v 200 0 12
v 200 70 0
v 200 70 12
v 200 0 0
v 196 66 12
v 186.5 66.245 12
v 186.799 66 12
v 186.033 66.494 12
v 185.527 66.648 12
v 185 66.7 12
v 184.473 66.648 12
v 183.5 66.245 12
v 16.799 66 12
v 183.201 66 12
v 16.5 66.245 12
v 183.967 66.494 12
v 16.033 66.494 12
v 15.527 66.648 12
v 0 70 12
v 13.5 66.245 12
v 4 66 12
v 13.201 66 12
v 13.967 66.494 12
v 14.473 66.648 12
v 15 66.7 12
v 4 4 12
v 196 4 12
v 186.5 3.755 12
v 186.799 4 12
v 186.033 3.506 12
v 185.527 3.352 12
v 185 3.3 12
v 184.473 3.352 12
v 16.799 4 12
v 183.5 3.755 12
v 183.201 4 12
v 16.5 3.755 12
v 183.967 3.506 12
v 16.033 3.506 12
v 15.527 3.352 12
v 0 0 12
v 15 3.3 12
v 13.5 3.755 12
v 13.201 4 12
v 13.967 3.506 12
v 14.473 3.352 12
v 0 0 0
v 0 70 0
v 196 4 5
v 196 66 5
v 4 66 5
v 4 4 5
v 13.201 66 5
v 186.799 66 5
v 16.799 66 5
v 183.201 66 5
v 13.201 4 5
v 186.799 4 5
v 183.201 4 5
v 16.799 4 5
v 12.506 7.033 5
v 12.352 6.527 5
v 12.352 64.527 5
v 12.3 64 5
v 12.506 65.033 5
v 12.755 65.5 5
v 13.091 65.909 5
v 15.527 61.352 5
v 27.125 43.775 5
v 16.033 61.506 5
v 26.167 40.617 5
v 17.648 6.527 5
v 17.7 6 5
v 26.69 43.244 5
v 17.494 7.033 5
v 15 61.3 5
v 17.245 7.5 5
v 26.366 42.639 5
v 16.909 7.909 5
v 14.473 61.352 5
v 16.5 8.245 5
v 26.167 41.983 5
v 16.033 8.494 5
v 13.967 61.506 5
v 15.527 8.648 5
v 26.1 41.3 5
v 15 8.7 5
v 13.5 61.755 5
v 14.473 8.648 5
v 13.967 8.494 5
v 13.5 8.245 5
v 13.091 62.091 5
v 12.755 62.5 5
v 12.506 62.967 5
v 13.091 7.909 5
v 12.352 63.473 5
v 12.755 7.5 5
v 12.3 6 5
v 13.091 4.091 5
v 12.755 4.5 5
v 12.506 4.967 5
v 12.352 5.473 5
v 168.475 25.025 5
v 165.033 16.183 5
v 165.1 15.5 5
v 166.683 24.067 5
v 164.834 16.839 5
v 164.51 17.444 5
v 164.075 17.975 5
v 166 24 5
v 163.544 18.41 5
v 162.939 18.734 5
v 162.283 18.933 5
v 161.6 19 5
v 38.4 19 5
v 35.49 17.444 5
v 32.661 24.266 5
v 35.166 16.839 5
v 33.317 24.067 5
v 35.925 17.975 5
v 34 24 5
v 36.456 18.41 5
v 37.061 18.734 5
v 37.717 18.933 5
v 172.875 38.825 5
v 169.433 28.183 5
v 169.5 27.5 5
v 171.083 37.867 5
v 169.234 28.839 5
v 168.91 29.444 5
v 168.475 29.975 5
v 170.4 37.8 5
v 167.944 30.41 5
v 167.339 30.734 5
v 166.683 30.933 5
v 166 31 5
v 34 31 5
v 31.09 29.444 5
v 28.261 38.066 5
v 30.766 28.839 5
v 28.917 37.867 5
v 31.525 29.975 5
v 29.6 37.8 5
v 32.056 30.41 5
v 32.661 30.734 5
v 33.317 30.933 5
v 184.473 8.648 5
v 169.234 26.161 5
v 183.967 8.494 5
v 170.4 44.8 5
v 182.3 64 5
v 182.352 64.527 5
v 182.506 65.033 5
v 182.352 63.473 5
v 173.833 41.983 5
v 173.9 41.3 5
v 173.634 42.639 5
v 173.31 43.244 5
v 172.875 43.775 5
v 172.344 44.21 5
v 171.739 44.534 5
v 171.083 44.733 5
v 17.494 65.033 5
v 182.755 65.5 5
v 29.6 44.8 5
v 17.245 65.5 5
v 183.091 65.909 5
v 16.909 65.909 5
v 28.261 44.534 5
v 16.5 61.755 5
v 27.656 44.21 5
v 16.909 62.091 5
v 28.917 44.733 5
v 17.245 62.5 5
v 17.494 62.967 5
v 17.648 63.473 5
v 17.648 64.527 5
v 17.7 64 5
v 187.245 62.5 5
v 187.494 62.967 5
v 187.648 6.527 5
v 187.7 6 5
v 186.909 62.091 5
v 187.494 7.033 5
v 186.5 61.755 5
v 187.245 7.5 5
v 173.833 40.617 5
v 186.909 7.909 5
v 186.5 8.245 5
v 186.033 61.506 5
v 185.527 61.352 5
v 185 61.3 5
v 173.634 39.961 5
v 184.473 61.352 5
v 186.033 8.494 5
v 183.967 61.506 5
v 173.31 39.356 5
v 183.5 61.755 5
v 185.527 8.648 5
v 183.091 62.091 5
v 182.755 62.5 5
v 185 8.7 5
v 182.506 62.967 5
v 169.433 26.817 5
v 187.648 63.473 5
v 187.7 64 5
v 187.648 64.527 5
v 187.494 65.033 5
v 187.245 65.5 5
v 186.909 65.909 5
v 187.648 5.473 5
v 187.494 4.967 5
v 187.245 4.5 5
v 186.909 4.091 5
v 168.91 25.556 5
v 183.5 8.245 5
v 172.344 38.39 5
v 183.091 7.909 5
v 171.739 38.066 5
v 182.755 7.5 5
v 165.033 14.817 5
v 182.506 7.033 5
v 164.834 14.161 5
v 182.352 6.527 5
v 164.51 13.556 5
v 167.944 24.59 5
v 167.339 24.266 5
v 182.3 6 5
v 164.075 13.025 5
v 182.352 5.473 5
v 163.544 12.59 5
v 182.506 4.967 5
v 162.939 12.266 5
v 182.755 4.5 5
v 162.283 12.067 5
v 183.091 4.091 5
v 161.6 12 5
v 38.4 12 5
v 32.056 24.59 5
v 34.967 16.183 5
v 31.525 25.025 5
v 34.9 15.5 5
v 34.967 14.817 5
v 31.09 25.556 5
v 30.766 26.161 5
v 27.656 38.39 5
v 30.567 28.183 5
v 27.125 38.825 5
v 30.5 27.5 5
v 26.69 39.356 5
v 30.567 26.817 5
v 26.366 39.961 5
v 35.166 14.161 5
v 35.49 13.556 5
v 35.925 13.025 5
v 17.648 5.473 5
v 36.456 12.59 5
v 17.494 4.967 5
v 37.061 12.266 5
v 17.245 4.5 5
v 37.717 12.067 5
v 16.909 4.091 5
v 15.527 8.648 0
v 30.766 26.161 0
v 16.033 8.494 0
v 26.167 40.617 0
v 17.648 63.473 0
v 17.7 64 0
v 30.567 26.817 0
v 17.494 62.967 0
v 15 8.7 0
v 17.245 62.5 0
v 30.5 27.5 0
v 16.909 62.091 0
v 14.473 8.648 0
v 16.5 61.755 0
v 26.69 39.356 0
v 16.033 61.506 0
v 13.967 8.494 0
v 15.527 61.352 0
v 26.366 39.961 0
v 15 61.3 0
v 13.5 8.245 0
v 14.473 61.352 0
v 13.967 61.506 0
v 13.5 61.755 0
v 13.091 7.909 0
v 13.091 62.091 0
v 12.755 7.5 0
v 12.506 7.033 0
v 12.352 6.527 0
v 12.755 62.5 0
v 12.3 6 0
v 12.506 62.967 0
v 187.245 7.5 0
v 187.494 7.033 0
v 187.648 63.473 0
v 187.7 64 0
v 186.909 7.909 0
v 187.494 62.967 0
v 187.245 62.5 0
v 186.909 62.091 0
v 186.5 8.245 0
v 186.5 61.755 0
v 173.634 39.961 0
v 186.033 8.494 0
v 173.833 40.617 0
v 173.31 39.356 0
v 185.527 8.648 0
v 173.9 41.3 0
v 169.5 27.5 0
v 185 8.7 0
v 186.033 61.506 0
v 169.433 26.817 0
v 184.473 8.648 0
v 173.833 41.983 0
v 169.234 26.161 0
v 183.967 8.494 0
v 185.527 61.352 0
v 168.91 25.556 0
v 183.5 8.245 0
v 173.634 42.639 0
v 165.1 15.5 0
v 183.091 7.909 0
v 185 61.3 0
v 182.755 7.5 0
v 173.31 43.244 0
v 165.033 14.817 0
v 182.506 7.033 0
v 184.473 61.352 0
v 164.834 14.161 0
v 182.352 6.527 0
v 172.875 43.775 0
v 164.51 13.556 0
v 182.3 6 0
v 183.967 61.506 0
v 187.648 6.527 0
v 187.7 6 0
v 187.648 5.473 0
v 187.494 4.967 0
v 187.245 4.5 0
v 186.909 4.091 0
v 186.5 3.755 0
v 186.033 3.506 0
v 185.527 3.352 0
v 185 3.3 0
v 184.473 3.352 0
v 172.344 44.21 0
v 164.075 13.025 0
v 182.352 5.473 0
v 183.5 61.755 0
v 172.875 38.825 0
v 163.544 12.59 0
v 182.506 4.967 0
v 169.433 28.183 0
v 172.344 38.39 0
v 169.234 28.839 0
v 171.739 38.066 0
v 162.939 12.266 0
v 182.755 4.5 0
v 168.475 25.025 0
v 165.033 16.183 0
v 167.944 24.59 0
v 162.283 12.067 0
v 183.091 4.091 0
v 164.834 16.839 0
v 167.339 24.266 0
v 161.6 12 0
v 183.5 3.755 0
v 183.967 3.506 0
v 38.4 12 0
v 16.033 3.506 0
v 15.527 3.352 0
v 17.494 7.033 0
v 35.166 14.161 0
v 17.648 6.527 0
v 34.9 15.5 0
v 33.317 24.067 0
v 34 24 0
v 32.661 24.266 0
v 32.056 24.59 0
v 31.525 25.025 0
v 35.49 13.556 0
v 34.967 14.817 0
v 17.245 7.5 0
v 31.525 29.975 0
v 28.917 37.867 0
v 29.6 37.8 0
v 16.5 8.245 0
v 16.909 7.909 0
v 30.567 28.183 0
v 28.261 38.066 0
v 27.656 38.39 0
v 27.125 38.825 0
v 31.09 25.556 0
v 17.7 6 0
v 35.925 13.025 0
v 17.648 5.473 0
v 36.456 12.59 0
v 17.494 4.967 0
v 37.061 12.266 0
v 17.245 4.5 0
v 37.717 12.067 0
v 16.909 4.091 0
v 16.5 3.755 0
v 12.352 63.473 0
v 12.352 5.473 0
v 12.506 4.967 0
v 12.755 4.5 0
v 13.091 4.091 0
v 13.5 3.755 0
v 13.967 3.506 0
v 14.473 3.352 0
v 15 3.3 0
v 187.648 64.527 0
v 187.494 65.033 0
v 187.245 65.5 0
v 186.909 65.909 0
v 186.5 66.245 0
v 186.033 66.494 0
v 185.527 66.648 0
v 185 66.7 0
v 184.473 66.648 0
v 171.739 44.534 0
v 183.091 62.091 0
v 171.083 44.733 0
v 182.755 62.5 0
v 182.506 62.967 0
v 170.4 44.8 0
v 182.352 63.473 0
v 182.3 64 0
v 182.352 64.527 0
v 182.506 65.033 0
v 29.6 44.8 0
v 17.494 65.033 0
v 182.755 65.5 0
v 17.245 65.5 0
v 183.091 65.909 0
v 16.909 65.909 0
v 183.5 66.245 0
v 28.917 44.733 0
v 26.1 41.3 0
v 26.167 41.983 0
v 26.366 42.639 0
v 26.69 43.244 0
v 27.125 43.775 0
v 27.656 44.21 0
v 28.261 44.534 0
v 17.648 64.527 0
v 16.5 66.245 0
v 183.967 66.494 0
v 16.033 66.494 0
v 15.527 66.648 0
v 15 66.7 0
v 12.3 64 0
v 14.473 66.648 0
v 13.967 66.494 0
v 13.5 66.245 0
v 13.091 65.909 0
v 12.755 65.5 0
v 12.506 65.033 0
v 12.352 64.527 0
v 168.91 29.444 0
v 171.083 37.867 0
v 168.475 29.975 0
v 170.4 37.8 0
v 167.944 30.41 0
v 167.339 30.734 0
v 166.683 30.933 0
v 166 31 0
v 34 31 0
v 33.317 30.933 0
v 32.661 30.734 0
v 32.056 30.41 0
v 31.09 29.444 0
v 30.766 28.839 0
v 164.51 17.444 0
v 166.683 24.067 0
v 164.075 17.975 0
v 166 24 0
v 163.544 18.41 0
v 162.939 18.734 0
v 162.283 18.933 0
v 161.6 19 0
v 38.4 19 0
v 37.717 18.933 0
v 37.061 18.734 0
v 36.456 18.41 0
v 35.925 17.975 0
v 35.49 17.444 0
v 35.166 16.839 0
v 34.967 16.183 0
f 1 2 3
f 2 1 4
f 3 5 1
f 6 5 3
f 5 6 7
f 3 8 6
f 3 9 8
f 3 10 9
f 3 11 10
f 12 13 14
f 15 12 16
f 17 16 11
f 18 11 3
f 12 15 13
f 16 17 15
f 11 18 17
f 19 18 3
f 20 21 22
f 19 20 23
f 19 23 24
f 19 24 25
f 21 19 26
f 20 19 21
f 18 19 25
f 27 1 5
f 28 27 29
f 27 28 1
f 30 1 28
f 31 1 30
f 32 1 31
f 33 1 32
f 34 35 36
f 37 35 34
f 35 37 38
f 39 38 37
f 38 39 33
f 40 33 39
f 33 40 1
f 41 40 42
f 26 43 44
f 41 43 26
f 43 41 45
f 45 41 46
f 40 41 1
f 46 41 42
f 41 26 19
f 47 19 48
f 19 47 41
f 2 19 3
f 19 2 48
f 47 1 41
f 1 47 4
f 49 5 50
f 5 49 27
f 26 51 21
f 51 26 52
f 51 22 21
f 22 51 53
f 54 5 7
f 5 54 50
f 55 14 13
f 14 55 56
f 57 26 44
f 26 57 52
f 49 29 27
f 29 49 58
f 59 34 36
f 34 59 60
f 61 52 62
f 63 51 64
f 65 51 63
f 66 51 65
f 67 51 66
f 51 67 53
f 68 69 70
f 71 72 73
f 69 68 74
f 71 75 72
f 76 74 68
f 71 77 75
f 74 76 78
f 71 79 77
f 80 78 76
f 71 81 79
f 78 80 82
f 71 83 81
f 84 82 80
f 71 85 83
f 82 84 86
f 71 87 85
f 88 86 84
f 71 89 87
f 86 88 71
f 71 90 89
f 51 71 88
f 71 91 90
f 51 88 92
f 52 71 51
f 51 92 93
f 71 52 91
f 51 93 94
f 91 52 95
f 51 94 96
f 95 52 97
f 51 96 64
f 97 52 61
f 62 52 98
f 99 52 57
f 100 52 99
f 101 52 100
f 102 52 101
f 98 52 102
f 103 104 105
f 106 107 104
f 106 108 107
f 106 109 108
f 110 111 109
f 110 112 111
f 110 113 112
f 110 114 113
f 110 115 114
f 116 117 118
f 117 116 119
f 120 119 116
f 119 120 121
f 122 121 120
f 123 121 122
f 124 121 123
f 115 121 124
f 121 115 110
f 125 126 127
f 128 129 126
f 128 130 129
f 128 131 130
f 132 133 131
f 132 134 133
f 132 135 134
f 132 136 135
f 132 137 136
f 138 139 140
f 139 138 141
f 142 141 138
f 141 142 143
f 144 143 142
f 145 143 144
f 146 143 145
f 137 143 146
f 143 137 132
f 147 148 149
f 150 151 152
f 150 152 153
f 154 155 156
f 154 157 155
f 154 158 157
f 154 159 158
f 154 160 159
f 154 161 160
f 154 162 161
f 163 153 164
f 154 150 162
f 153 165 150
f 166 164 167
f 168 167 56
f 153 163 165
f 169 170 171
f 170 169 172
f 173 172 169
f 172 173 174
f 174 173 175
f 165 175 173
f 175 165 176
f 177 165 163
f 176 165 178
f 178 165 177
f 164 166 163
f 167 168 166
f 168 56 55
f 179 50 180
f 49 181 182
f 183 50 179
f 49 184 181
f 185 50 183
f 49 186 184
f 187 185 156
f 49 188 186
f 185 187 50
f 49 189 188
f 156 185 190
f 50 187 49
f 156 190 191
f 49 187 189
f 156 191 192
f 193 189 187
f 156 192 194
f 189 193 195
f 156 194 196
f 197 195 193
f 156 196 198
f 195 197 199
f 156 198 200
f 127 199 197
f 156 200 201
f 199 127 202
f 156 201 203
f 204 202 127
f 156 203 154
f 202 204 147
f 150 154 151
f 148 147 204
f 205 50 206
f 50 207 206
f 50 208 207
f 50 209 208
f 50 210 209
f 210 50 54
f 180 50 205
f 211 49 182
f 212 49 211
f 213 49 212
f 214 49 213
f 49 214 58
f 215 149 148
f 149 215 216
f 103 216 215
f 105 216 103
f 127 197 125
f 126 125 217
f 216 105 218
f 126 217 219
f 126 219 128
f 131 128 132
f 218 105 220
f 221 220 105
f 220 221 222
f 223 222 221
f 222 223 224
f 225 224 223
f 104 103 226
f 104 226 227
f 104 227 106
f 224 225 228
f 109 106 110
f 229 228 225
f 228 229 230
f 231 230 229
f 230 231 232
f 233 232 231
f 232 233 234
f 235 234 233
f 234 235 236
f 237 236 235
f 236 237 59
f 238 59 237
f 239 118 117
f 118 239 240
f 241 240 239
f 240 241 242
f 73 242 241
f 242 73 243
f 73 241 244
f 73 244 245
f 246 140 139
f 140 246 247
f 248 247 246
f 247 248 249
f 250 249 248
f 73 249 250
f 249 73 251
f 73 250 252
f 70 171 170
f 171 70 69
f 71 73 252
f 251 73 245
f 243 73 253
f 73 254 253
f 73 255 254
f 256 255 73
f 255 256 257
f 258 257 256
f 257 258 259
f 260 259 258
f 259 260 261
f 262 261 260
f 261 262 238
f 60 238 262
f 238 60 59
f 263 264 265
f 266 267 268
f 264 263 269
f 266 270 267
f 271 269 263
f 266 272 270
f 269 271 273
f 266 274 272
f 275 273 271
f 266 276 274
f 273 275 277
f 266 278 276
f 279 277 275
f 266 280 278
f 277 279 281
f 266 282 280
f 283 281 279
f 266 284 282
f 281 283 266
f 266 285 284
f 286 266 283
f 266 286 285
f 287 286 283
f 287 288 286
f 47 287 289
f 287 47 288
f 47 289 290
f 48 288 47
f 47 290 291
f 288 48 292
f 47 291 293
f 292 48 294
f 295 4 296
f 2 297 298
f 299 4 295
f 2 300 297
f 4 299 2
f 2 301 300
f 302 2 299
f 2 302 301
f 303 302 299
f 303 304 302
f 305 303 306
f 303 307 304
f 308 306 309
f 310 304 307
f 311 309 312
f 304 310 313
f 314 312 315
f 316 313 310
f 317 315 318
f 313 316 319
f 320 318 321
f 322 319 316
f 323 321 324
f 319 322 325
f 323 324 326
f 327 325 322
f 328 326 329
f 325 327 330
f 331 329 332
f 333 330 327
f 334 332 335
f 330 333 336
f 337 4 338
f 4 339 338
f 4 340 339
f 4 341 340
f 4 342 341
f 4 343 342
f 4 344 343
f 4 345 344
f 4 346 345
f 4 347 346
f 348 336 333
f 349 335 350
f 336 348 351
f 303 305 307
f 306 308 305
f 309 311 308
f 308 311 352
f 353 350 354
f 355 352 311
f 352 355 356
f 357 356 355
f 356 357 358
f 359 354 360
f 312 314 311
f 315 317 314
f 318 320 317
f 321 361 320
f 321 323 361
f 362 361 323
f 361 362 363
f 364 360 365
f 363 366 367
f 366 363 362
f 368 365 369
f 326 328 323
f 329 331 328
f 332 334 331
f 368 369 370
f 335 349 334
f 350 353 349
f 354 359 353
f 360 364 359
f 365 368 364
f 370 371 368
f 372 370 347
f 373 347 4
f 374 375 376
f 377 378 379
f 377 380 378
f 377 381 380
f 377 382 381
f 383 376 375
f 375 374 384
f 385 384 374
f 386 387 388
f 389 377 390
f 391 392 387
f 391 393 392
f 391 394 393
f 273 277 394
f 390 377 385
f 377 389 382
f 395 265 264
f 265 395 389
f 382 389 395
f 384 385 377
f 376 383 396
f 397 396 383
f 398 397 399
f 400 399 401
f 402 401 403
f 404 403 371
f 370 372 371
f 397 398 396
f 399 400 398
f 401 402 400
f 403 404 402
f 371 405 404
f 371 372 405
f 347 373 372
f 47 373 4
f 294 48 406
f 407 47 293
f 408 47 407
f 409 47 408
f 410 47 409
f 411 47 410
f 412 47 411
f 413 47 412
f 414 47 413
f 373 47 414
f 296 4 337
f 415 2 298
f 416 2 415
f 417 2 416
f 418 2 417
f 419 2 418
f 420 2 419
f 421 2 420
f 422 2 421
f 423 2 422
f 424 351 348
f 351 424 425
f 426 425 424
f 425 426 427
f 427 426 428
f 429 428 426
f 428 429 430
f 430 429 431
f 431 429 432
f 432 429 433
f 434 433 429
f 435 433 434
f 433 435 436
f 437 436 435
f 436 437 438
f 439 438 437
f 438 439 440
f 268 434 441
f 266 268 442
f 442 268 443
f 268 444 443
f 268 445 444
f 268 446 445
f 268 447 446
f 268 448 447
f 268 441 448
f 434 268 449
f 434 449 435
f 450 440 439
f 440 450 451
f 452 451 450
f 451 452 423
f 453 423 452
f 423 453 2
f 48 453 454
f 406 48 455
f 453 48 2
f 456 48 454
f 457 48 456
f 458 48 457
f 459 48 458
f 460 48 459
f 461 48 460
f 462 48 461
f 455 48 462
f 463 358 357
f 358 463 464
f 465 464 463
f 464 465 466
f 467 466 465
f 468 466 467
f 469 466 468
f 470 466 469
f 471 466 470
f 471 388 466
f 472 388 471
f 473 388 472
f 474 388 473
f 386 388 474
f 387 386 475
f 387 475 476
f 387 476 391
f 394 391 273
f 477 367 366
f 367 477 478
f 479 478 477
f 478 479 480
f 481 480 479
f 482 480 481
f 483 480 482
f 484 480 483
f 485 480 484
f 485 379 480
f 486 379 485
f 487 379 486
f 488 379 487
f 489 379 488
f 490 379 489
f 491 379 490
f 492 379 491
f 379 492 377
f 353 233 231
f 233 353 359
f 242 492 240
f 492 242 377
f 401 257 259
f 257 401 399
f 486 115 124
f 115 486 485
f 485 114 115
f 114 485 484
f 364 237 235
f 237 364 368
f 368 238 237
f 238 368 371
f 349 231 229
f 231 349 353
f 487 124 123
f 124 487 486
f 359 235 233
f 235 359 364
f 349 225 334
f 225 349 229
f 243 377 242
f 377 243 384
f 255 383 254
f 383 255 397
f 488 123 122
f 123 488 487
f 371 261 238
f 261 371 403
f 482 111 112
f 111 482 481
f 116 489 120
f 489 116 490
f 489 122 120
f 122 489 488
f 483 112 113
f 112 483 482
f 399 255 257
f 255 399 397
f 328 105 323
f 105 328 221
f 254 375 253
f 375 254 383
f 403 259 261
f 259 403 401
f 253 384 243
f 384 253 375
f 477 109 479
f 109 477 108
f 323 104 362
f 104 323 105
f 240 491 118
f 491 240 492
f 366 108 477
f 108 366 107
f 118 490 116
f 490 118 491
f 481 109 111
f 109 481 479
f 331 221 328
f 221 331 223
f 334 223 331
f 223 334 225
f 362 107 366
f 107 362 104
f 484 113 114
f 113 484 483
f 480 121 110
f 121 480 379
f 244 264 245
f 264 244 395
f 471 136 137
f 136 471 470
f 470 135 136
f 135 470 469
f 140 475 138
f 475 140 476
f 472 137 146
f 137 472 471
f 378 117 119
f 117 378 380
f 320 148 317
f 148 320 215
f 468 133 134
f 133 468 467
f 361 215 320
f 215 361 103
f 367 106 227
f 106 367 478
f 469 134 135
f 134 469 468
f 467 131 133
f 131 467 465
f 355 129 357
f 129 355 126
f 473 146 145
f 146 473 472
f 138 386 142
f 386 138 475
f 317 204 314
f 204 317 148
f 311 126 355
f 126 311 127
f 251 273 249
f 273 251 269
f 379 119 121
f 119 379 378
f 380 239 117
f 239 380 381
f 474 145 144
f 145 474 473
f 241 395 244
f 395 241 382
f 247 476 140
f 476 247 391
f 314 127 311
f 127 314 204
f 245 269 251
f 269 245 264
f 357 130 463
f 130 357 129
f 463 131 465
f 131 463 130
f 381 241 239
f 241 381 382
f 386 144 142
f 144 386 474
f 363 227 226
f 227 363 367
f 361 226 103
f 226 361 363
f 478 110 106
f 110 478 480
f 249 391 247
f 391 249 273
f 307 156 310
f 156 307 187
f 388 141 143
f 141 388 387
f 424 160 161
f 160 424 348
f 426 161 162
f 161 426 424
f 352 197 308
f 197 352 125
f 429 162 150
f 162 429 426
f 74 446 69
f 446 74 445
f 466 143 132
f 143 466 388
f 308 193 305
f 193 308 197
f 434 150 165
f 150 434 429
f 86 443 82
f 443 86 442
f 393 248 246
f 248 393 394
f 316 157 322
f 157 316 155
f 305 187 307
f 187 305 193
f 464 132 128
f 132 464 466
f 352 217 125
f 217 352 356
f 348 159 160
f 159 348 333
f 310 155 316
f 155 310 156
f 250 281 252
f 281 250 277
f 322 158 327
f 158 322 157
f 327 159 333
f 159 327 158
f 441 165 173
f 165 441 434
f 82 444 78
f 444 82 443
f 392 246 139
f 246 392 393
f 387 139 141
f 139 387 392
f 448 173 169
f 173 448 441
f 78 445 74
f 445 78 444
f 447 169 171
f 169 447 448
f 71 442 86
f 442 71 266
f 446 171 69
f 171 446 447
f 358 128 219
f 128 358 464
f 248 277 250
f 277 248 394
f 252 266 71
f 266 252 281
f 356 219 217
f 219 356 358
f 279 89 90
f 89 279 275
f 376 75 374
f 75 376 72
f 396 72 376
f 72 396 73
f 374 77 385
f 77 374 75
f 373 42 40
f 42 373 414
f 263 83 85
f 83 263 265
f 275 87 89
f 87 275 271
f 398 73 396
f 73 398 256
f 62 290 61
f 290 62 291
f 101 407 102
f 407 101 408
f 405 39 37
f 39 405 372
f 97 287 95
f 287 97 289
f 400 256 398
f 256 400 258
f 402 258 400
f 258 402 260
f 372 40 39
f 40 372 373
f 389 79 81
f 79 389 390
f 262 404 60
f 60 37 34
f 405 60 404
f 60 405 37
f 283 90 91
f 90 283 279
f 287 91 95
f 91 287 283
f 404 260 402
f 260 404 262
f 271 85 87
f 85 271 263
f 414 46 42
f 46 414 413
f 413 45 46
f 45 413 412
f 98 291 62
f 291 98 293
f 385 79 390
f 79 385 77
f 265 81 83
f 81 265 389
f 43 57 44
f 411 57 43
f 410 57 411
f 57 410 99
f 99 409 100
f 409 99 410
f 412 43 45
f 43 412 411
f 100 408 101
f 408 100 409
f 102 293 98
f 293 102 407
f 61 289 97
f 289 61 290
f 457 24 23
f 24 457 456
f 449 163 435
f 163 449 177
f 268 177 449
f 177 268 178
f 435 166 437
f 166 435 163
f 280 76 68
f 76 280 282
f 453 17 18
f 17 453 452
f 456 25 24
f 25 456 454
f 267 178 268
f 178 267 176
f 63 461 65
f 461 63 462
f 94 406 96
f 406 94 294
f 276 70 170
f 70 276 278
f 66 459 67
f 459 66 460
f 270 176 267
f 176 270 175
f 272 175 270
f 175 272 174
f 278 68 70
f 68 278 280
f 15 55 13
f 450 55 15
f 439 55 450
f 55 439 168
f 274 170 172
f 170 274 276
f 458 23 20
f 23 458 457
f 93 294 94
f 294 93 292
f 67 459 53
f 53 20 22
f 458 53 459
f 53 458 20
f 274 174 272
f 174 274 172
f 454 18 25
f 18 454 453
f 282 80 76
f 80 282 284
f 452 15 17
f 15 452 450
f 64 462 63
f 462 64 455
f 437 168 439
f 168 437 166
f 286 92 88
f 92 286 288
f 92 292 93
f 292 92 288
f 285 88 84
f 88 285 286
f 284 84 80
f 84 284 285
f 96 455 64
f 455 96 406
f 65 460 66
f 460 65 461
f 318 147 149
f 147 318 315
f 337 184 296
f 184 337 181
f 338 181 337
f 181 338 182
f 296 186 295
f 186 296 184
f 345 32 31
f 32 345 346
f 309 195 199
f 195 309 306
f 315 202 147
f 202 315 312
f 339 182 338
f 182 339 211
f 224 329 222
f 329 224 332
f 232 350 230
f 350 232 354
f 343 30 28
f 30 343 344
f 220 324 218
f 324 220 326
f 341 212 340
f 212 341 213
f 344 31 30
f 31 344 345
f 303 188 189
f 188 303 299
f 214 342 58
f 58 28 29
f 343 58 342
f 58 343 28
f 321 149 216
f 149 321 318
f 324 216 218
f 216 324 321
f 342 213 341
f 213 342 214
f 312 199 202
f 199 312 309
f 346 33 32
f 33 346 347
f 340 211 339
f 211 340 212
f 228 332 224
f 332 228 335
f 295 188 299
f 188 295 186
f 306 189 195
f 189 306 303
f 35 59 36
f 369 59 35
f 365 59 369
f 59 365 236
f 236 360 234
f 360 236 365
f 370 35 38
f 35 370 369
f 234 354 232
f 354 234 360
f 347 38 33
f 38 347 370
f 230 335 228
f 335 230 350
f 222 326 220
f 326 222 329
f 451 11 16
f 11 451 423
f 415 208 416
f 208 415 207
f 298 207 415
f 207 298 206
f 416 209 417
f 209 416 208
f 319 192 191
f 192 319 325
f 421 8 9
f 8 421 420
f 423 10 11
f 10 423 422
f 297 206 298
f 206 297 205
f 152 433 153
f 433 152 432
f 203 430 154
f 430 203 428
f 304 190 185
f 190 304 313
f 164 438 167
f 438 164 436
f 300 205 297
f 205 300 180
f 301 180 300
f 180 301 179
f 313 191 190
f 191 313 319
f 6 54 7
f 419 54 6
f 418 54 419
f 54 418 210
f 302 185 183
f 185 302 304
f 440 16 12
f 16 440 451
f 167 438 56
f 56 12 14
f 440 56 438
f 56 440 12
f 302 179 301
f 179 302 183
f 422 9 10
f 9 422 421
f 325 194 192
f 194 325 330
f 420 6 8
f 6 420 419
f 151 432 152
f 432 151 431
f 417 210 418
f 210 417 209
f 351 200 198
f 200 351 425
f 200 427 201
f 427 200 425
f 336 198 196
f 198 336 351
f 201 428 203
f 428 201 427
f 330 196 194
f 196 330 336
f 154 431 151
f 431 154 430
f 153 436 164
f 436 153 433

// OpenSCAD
$fn = 32;

// ----------------------------------------------------------------------
// Slotted panel: 200 x 70 mm, 3 ряда of slots
// ----------------------------------------------------------------------

// --- parameters (mm) ---
panel_w = 200;            // panel width
panel_d = 70;             // panel depth
thick = 5;                // panel thickness
slot_w = 7;               // slot width
pitch0 = 12;              // first row pitch
pitch_step = 1.8;         // pitch increase per row
margin = 12;              // margin around the slot field
rows = 3;                 // number of slot rows
mount_d = 5.4;            // mounting holes
mount_x = 85;             // mounting hole offset
rim_h = 12;               // rim height
rim_t = 4;                // rim wall thickness

difference() {
  union() {
    cube([panel_w, panel_d, thick]);
    translate([0, 0, thick - 1]) difference() {
      cube([panel_w, panel_d, rim_h - thick + 1]);
      translate([rim_t, rim_t, -2.5]) cube([panel_w - 2 * rim_t, panel_d - 2 * rim_t, rim_h - thick + 6]);
    }
  }
  /* slot rows: stadium shaped cutters, 2.5 mm clear of both faces */
  /* row 0: pitch 12, length 123.2 */
  hull() {
    translate([38.4, 15.5, -2.5]) cylinder(h = thick + 5, d = slot_w);
    translate([161.6, 15.5, -2.5]) cylinder(h = thick + 5, d = slot_w);
  }
  /* row 1: pitch 13.8, length 132 */
  hull() {
    translate([34, 27.5, -2.5]) cylinder(h = thick + 5, d = slot_w);
    translate([166, 27.5, -2.5]) cylinder(h = thick + 5, d = slot_w);
  }
  /* row 2: pitch 15.6, length 140.8 */
  hull() {
    translate([29.6, 41.3, -2.5]) cylinder(h = thick + 5, d = slot_w);
    translate([170.4, 41.3, -2.5]) cylinder(h = thick + 5, d = slot_w);
  }
  translate([15, 6, -2.5]) cylinder(h = 17, d = mount_d);
  translate([15, 64, -2.5]) cylinder(h = 17, d = mount_d);
  translate([185, 6, -2.5]) cylinder(h = 17, d = mount_d);
  translate([185, 64, -2.5]) cylinder(h = 17, d = mount_d);
}
